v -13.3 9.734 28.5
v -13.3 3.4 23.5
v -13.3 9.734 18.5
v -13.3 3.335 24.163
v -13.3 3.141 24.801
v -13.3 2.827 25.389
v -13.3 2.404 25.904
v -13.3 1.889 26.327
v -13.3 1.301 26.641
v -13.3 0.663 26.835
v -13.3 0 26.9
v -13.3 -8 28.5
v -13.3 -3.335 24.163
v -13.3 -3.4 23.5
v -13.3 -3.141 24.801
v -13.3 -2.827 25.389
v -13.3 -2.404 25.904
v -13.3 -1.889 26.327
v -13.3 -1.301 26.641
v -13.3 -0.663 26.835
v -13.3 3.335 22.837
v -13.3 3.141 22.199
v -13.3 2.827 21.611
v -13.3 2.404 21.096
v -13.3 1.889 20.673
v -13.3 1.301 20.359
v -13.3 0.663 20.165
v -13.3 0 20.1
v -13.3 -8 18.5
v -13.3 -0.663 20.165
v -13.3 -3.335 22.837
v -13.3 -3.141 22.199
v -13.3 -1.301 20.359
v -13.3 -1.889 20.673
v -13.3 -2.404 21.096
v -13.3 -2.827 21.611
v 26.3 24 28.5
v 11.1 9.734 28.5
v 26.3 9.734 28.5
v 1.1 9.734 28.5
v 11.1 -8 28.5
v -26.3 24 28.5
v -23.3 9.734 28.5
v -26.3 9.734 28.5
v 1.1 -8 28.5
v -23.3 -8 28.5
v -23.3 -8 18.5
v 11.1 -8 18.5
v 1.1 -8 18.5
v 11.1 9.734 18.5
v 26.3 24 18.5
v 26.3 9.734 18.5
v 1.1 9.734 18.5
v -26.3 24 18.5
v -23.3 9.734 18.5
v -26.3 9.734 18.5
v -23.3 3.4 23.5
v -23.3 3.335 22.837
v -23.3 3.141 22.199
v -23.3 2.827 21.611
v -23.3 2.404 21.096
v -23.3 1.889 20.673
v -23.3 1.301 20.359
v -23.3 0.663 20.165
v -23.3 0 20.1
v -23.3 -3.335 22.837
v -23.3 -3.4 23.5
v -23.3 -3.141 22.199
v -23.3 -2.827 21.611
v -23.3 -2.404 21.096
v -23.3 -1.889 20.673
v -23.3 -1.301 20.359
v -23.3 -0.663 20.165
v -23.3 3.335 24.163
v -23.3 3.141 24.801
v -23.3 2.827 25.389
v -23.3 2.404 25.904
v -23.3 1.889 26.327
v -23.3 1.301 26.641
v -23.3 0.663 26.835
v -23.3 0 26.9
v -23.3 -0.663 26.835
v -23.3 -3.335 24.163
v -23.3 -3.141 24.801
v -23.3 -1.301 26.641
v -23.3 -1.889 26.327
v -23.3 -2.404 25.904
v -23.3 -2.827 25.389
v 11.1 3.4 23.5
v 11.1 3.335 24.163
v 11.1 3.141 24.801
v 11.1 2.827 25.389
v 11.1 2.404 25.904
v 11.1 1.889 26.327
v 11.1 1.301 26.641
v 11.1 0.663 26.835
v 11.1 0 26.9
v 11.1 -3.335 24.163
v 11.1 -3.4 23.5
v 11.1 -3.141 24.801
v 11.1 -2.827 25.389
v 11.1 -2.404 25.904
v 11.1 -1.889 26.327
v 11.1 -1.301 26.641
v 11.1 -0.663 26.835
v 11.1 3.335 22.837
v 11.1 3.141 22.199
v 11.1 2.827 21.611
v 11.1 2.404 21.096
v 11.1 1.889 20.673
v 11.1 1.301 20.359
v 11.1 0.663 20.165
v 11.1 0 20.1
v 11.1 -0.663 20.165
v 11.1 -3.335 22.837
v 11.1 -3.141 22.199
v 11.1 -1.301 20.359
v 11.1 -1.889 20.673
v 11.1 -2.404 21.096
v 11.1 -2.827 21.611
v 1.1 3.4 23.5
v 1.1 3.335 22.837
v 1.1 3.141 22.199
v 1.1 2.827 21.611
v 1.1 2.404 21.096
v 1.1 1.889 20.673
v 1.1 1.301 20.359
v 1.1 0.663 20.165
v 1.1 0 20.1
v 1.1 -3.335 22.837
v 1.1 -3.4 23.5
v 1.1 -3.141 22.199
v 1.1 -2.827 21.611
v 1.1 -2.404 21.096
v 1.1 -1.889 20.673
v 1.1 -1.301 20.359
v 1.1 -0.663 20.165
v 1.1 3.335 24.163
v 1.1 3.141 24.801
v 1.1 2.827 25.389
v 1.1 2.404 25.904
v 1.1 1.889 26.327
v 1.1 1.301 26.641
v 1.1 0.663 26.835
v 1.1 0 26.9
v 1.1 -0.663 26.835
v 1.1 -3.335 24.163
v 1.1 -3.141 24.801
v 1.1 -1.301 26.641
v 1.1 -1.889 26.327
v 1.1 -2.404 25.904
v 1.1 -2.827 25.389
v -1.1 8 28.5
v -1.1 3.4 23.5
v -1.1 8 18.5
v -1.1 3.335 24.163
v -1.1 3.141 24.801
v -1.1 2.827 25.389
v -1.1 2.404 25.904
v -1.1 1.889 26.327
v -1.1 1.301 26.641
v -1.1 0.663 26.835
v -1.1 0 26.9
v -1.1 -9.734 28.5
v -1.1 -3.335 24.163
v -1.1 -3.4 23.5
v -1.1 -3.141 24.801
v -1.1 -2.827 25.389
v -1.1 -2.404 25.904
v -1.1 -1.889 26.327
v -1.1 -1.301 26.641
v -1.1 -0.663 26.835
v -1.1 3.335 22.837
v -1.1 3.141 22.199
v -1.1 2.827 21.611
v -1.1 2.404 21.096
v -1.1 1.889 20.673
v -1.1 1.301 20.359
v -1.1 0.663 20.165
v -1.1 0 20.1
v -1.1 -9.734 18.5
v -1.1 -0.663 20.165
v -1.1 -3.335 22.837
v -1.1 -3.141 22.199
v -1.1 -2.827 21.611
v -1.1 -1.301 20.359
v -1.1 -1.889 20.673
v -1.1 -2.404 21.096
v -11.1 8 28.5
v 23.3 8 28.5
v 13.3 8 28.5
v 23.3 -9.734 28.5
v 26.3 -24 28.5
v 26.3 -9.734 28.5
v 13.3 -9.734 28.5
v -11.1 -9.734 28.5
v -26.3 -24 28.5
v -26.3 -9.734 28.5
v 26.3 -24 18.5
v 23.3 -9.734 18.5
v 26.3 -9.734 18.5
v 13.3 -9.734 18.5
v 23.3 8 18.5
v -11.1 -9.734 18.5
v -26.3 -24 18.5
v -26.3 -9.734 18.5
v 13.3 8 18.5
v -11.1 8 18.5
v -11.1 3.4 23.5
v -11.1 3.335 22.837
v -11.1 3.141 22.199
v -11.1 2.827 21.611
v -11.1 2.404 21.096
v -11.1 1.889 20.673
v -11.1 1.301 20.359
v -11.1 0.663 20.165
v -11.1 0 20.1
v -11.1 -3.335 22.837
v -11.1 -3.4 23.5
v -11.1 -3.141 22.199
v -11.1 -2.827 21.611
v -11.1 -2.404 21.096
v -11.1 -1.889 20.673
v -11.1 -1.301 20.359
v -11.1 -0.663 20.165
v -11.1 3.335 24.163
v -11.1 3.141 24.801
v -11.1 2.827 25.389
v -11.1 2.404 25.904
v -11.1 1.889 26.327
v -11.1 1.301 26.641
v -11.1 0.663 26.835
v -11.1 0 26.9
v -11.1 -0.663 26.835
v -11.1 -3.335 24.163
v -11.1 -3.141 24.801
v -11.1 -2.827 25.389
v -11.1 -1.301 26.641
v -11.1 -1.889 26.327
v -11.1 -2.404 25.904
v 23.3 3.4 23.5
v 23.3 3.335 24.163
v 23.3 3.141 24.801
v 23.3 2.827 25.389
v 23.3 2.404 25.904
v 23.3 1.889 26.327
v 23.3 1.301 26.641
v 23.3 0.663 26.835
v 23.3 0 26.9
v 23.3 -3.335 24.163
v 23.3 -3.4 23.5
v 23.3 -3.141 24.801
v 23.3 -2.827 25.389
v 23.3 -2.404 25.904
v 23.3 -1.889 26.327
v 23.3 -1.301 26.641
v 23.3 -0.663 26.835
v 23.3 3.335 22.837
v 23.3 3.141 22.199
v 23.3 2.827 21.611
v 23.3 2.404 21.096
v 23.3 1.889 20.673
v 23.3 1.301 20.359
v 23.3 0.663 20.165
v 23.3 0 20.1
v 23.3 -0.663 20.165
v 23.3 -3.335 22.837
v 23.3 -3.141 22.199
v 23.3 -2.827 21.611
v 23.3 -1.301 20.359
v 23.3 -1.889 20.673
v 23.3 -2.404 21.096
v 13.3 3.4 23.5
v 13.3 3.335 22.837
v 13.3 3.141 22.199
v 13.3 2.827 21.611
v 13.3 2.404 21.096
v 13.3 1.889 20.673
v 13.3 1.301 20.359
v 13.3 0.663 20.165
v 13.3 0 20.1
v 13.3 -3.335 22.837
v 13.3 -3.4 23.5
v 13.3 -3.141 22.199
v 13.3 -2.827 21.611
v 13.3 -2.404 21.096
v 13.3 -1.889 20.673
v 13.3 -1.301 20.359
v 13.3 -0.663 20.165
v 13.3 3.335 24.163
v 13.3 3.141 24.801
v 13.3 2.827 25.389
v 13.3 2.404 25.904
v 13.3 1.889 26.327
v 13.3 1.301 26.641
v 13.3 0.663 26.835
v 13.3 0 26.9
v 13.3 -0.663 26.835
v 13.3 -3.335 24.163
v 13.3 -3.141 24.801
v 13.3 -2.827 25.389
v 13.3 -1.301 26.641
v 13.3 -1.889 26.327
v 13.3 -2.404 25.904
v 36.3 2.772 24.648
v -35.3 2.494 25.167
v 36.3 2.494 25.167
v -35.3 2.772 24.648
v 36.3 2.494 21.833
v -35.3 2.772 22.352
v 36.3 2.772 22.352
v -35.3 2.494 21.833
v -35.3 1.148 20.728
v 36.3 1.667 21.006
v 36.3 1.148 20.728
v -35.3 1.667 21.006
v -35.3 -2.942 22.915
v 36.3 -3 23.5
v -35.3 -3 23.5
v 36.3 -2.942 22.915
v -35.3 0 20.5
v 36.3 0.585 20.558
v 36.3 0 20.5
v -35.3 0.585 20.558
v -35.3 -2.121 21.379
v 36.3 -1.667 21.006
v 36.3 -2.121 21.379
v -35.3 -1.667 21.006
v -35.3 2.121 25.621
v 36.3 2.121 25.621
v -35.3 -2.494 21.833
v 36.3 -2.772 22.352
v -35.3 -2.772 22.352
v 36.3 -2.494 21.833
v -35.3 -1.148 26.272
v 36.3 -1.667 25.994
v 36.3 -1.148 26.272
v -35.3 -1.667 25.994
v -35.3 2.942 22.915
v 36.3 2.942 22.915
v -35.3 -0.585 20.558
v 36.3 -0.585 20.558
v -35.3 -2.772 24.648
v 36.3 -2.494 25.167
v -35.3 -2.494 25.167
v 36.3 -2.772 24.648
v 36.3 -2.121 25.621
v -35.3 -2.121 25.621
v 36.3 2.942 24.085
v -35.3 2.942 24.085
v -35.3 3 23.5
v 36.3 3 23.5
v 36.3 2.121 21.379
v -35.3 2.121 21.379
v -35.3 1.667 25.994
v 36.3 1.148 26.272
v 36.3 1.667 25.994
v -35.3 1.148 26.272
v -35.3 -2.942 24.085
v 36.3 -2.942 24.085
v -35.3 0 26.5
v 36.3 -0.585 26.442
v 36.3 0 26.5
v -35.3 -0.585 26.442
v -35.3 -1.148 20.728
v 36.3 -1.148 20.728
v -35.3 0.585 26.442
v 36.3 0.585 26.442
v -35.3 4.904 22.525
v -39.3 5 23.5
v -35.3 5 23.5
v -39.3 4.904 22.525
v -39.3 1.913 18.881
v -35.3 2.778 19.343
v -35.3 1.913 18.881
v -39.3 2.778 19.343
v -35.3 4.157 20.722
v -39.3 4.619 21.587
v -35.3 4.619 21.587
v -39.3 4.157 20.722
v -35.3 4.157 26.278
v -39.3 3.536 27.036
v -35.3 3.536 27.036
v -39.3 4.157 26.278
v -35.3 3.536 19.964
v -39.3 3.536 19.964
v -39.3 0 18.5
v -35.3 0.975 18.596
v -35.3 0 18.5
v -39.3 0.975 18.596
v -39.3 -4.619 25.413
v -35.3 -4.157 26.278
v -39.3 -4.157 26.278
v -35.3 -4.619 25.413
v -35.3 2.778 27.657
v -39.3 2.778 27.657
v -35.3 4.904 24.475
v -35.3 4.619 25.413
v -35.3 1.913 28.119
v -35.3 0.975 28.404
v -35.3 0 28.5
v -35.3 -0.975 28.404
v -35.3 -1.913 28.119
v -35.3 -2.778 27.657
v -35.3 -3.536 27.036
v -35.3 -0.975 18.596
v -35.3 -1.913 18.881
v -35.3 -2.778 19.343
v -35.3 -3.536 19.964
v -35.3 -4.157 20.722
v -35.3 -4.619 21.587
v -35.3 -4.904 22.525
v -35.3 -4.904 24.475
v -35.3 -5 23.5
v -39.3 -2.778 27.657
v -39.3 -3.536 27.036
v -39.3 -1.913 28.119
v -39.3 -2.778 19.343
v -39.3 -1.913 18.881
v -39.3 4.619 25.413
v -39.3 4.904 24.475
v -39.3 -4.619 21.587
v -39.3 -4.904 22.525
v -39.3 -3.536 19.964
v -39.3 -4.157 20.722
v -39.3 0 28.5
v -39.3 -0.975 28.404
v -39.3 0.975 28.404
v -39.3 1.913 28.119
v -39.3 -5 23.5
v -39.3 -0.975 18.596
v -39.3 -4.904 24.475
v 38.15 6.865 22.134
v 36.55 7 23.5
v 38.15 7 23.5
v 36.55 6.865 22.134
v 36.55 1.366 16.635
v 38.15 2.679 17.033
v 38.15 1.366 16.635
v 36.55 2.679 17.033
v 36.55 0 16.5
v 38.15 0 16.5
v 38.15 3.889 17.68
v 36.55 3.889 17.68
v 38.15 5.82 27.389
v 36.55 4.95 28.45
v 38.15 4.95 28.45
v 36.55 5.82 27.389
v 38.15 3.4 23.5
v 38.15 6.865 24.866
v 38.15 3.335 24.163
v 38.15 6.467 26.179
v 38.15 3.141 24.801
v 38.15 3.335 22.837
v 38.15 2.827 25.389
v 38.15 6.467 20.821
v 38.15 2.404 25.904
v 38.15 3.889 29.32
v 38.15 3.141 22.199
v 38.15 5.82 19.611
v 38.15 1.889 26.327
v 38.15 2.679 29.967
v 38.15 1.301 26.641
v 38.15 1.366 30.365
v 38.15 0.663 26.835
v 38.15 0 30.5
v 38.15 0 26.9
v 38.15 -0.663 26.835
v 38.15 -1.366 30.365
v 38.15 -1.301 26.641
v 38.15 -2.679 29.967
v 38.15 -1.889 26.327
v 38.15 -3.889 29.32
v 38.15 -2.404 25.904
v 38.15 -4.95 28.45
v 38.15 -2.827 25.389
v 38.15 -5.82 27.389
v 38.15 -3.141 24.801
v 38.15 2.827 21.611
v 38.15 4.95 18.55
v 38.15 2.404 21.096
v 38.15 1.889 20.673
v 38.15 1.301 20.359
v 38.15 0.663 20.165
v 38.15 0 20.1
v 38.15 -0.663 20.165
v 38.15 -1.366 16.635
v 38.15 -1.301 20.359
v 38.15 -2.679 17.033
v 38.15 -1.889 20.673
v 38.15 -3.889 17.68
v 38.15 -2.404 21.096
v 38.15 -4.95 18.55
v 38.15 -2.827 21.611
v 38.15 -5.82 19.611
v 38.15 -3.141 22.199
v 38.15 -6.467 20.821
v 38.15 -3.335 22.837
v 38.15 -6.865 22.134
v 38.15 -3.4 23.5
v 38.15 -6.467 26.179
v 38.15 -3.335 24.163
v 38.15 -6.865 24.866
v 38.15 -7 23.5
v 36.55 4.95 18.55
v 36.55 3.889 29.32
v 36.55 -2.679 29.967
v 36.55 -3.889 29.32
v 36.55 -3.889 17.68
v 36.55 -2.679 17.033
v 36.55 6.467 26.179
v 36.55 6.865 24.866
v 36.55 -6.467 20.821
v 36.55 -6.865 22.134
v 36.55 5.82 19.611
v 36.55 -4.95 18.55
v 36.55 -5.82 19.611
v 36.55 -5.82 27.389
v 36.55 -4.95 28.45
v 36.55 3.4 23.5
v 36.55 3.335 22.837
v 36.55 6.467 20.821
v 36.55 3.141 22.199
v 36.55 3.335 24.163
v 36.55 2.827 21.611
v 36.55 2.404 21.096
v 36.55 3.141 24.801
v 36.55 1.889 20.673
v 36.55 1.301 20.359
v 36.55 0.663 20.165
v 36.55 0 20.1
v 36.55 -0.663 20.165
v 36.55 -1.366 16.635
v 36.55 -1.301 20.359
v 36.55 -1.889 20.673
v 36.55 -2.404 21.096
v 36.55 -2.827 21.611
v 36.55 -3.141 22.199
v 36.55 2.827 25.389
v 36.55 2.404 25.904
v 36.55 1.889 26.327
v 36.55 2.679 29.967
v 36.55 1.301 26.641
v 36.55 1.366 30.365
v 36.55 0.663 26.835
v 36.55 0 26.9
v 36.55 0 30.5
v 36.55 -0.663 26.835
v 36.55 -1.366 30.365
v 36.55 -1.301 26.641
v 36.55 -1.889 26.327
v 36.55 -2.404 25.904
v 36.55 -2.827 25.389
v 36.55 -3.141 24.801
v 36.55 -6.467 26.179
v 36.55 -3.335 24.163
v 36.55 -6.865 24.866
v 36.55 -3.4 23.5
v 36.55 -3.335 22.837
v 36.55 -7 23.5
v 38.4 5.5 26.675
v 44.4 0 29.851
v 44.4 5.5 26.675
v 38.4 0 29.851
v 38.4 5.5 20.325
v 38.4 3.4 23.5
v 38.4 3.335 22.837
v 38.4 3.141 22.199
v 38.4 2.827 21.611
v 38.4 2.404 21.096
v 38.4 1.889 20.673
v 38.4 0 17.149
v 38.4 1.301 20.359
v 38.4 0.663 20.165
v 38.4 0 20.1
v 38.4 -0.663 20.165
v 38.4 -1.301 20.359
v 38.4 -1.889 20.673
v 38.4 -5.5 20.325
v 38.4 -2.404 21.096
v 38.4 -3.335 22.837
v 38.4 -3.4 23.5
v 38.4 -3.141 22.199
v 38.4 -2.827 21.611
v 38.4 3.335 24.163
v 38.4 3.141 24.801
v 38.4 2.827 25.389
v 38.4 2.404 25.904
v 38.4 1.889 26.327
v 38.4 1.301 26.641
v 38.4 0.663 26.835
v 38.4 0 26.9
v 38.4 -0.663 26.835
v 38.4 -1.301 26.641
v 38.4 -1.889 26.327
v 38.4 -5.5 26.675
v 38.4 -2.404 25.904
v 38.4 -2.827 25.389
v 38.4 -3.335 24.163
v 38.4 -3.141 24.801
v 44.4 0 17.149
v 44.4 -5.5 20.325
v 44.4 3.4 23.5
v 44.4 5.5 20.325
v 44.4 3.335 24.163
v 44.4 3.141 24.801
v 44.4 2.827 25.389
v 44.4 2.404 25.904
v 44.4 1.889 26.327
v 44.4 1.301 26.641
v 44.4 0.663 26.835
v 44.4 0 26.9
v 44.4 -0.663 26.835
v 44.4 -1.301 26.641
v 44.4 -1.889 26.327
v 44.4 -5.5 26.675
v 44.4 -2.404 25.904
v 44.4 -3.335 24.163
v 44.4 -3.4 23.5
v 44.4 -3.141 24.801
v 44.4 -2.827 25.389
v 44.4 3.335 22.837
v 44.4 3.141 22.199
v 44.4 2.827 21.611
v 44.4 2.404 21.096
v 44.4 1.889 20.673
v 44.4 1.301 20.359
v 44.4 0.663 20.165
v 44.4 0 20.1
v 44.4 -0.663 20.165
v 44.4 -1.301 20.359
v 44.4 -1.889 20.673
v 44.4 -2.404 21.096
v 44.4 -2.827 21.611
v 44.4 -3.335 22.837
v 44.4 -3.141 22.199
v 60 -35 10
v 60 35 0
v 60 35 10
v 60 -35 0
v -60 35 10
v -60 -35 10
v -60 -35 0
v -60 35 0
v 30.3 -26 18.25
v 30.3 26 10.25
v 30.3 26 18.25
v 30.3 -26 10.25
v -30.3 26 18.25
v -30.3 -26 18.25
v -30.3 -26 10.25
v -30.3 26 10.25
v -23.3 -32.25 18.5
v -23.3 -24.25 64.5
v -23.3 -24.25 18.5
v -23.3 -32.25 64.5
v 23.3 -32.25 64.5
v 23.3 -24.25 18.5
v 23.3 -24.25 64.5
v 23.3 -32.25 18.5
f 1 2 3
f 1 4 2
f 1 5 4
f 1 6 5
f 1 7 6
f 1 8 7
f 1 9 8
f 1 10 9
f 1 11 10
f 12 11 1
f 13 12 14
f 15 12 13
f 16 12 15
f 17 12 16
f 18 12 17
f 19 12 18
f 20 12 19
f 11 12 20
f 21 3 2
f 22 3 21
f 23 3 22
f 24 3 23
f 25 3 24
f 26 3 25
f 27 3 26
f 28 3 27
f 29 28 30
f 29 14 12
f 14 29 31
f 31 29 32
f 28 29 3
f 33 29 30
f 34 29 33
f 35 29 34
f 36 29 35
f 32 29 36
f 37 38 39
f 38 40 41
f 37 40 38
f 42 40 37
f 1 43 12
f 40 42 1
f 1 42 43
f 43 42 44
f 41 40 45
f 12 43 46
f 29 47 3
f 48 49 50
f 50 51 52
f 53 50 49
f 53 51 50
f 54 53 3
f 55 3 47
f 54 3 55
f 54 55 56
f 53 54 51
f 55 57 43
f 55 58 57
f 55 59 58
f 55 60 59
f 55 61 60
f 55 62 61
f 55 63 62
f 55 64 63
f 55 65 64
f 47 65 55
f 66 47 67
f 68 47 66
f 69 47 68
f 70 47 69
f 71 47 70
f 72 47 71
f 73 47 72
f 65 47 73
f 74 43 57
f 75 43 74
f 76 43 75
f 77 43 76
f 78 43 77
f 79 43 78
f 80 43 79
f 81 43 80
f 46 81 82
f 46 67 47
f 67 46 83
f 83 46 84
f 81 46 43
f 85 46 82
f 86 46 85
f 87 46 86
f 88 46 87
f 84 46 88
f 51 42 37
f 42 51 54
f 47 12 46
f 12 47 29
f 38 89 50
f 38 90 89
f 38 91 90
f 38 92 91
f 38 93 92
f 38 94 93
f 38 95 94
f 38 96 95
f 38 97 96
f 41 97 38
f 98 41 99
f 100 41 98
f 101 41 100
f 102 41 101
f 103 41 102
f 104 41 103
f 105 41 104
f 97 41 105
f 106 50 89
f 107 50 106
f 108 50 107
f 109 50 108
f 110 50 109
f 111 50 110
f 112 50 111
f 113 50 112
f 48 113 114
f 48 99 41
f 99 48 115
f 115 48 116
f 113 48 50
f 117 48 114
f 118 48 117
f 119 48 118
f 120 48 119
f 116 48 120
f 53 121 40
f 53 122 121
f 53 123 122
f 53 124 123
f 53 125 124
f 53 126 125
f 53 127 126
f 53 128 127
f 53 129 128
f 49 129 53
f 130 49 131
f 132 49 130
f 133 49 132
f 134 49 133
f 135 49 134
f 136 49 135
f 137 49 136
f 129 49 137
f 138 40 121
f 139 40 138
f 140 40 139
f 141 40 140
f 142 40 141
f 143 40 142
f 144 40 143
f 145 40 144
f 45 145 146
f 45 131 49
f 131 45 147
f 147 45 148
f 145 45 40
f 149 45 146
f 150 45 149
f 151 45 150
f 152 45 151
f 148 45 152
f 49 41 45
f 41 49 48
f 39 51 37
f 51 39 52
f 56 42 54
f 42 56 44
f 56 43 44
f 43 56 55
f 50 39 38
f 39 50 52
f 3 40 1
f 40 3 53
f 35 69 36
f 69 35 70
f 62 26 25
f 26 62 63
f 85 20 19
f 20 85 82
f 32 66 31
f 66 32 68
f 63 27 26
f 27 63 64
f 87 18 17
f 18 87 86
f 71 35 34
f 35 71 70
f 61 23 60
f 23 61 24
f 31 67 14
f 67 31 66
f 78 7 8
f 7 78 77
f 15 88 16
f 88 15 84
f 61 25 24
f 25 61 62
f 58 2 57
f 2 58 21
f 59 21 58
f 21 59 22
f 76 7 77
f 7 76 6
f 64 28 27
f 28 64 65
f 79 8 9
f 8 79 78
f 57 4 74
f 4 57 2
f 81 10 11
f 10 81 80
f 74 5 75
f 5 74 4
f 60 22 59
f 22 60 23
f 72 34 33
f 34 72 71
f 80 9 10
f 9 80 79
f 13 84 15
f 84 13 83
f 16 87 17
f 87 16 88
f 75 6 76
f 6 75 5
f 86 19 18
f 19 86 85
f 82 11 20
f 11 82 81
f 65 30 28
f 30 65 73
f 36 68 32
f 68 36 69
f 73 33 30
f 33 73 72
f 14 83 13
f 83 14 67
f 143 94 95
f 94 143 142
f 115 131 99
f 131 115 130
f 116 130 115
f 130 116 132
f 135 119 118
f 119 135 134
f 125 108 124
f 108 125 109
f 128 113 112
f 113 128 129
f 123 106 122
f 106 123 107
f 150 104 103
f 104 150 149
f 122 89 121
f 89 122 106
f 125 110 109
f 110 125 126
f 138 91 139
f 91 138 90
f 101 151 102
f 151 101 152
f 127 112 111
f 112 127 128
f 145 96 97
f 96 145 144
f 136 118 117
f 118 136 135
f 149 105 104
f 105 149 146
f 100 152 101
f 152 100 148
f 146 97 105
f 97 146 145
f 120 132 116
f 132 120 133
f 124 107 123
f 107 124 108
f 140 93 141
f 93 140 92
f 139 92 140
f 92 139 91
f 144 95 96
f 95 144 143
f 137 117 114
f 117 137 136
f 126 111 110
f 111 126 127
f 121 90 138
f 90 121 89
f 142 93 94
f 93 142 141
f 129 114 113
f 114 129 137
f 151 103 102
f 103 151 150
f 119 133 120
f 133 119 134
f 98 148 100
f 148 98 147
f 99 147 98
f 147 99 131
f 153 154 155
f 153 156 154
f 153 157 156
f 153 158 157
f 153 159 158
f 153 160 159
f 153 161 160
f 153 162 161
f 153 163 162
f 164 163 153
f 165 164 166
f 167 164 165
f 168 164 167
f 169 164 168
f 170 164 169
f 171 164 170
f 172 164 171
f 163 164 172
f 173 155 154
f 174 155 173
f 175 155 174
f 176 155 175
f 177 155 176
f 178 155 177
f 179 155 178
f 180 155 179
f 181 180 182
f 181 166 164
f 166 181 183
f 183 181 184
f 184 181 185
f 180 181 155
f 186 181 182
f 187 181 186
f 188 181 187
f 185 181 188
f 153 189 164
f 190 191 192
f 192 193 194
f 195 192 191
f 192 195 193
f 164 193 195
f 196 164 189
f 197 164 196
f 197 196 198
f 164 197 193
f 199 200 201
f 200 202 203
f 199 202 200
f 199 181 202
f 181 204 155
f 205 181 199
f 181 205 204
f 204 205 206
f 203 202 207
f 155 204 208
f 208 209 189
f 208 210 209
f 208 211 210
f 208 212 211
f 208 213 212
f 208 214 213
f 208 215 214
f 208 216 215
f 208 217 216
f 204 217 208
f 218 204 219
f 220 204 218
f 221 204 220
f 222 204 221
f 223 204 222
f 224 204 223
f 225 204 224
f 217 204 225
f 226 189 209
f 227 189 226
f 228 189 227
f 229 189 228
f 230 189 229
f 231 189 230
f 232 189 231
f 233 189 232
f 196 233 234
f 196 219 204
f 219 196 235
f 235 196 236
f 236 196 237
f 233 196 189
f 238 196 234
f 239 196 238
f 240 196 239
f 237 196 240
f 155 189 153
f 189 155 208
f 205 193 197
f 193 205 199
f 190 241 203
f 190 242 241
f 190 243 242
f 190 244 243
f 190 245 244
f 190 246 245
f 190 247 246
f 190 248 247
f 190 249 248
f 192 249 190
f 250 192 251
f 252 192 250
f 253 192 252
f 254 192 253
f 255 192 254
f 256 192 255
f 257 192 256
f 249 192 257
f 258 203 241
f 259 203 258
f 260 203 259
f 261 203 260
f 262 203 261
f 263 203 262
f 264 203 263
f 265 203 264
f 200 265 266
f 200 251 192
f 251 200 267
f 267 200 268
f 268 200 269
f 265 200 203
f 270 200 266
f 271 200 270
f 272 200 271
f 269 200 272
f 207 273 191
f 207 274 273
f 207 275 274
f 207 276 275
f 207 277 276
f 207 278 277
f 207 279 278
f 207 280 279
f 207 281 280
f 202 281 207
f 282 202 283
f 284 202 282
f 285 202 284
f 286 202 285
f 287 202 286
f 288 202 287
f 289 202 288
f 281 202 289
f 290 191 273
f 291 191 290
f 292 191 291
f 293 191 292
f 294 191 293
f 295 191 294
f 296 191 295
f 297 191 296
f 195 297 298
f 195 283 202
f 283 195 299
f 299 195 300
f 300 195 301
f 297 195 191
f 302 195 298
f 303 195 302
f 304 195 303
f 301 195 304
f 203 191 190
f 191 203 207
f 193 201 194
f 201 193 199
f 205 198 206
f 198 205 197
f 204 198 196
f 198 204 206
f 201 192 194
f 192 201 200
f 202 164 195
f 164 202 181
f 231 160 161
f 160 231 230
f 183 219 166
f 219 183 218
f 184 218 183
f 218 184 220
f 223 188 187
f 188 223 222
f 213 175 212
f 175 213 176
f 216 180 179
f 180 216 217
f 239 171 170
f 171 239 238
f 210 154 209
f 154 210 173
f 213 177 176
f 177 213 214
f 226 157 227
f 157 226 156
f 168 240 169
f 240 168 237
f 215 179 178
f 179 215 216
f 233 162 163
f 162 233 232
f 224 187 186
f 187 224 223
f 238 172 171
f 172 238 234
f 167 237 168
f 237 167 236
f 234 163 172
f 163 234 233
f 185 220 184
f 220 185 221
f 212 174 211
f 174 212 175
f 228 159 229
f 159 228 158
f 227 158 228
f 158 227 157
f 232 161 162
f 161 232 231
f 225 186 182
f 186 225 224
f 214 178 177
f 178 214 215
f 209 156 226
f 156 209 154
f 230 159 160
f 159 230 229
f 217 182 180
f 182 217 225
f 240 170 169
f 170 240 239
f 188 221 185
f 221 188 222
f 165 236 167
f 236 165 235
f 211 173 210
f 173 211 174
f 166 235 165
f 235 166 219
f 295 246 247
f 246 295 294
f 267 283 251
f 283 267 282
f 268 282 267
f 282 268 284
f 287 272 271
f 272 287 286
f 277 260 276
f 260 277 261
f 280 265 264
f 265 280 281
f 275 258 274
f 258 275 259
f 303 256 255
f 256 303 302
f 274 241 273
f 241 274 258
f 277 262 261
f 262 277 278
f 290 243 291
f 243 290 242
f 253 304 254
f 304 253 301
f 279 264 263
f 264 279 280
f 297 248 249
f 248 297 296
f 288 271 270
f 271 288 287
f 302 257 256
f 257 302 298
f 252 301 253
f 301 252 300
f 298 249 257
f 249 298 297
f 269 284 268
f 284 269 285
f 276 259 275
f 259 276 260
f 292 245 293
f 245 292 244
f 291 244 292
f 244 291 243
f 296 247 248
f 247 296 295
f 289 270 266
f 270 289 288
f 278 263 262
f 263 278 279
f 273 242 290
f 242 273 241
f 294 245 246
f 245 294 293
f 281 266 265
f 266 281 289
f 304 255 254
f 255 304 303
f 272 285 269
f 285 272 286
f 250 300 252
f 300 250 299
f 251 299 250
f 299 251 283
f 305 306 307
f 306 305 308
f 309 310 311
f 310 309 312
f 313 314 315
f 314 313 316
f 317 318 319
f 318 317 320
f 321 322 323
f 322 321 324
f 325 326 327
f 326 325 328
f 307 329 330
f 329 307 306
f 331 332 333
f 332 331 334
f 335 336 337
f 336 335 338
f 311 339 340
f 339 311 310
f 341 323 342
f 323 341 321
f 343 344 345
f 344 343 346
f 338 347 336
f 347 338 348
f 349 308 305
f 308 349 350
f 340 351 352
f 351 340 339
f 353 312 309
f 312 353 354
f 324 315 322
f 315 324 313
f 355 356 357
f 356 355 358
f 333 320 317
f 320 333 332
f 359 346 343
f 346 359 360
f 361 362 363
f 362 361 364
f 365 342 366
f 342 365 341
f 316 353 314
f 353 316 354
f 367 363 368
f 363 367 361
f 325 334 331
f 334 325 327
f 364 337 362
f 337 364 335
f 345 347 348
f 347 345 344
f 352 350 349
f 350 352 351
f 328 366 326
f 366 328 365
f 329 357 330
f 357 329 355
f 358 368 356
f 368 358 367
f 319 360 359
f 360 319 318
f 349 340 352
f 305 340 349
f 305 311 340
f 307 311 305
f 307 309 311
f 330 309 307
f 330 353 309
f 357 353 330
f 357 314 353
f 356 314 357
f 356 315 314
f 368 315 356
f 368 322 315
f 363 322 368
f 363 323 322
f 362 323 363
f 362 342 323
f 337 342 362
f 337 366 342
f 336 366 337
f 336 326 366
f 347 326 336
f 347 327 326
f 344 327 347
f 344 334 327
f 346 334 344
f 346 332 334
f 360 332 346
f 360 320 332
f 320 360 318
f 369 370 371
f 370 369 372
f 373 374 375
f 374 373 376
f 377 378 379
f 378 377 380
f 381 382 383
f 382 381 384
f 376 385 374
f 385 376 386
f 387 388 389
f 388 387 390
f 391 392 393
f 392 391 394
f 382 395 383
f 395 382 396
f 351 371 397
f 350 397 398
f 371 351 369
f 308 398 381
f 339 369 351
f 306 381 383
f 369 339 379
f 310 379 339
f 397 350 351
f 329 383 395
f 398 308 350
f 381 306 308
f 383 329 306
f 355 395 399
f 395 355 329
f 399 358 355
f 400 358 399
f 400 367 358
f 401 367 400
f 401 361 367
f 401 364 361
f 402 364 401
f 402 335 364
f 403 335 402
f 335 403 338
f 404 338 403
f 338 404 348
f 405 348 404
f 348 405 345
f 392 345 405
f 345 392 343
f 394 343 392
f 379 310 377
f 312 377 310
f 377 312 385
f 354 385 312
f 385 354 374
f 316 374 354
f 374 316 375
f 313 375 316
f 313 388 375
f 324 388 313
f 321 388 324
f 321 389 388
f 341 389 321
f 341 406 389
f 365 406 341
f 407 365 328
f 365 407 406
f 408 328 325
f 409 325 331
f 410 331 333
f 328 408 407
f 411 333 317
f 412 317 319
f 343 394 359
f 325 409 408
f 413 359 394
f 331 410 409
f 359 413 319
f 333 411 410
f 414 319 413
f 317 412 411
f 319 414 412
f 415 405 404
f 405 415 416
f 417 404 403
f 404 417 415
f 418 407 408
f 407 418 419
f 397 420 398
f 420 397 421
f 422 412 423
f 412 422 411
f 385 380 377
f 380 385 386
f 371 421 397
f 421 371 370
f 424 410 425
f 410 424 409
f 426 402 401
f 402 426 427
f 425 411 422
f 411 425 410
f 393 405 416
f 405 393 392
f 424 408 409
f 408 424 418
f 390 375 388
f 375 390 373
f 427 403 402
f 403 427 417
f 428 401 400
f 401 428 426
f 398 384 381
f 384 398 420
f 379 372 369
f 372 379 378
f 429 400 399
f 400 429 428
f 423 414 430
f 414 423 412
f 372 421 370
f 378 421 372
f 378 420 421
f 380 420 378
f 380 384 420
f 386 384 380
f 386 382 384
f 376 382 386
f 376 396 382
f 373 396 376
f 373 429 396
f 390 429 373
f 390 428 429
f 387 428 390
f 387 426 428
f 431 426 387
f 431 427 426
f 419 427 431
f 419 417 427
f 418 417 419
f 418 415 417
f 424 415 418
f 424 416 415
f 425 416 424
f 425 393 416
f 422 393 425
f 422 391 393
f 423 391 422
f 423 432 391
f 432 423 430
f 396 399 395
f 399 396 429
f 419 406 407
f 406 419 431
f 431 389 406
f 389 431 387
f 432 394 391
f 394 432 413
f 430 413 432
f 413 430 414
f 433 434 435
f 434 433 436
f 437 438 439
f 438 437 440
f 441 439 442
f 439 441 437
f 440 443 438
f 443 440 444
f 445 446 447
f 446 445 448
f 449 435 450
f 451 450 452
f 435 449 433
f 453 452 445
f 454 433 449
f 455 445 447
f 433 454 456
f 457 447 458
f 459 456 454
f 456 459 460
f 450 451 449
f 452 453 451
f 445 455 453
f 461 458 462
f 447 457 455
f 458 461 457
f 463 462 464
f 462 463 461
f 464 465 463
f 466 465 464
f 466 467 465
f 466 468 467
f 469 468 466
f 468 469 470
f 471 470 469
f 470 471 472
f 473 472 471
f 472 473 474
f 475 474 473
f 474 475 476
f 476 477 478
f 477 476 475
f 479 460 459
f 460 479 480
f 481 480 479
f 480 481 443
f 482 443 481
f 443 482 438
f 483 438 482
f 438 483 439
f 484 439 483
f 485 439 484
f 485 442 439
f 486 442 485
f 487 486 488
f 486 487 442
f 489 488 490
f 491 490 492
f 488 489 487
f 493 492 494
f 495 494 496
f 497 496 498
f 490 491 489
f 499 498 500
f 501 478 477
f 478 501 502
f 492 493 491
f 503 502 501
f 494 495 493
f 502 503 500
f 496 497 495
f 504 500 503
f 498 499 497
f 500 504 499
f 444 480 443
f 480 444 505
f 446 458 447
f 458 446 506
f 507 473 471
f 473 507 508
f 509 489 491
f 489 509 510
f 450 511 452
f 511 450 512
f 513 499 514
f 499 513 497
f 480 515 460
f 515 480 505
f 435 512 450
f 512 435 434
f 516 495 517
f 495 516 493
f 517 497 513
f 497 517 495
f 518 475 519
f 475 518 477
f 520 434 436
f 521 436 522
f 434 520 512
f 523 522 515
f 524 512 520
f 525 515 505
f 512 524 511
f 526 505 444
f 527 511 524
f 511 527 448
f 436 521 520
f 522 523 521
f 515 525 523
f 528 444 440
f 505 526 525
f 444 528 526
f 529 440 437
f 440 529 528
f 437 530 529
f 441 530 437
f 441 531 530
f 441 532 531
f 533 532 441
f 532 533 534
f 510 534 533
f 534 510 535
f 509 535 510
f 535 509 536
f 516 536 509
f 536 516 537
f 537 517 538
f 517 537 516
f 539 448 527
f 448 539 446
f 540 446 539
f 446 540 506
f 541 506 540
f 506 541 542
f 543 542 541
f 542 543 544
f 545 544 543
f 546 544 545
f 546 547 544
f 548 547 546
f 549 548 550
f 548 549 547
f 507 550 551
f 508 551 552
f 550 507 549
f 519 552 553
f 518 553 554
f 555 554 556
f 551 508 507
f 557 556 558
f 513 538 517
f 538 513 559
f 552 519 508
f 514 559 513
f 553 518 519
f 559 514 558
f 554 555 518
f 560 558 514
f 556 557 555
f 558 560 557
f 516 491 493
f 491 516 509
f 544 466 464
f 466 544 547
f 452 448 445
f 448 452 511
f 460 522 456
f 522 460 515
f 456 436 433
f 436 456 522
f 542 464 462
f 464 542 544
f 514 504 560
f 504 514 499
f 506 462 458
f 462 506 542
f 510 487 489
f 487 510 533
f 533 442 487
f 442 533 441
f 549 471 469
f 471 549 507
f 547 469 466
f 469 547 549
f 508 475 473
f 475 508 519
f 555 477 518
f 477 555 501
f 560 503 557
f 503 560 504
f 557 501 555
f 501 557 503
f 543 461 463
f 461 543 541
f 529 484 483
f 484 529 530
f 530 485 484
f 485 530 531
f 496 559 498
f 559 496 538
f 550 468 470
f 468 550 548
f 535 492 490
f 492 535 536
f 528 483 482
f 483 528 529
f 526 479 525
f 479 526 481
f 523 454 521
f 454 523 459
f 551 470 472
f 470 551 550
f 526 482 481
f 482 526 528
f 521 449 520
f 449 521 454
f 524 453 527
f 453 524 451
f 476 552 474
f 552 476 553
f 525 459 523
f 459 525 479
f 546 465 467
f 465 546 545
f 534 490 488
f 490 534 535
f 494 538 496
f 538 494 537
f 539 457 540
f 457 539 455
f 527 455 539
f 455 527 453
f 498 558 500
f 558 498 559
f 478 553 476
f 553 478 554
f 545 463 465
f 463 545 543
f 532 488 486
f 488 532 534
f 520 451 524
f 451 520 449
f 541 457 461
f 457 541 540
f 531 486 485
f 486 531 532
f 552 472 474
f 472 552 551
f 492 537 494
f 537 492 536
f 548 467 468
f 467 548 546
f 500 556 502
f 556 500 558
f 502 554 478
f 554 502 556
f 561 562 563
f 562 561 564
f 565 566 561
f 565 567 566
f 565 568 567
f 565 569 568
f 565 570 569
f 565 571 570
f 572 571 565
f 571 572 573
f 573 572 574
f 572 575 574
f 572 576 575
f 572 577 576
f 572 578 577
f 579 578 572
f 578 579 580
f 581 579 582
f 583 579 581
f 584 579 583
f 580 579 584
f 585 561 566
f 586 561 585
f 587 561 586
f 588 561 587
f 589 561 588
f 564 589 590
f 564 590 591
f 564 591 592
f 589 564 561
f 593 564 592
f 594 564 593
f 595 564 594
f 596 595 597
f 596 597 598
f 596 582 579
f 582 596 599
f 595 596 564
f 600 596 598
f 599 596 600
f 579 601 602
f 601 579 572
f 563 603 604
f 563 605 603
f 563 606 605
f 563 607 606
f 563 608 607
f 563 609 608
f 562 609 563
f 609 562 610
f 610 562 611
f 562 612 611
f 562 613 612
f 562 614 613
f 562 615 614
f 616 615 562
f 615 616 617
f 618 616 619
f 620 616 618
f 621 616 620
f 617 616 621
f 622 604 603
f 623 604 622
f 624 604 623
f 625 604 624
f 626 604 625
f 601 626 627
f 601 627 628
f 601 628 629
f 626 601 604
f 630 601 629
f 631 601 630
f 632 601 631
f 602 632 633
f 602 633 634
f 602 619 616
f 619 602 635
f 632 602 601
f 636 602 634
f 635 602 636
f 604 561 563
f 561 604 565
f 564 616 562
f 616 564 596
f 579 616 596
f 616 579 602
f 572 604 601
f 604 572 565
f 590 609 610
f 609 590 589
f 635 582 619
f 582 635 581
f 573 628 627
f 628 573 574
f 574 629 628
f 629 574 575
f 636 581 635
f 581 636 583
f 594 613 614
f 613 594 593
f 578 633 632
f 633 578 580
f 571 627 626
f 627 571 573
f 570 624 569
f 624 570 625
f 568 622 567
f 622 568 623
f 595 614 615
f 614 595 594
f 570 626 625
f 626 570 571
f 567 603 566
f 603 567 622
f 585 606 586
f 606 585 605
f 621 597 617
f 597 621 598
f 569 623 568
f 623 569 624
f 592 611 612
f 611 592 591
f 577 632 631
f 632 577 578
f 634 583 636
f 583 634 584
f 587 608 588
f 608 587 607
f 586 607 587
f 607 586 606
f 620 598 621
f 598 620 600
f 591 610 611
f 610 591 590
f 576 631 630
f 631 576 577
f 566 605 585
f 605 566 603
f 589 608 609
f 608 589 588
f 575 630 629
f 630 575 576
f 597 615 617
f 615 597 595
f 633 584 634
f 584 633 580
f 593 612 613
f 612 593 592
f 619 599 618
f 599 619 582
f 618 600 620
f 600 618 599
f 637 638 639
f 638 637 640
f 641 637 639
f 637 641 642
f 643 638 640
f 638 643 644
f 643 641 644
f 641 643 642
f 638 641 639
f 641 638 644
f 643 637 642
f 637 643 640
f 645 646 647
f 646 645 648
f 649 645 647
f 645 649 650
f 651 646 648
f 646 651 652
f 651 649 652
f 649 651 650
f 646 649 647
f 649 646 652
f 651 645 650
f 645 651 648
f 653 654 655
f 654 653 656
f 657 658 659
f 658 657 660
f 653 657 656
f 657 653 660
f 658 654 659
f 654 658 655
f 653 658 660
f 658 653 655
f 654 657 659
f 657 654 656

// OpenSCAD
$fn = 32;

// ------------------------------------------------------------------------
// Comb hinge with flap: leaf 52.6 x 24 mm, pin d6, flap 46 mm
// Every part is its own module, assembly() places every instance.
// ------------------------------------------------------------------------

// --- part 1 ---
module hinge_bed() {
  difference() {
    translate([-60, -35, 0]) cube([120, 70, 10]);
  }
}

// --- part 2 ---
module hinge_riser() {
  difference() {
    translate([-30.3, -26, 0]) cube([60.6, 52, 8]);
  }
}

// --- part 3 ---
module hinge_leaf_a() {
  difference() {
    union() {
      translate([-23.3, -8, -5]) cube([10, 32, 10]);
      translate([1.1, -8, -5]) cube([10, 32, 10]);
      translate([-26.3, 9.734, -5]) cube([52.6, 14.266, 10]);
    }
    translate([-18.3, 0, 0]) rotate([0, 90, 0]) cylinder(h = 12, d = 6.8, center = true);
    translate([6.1, 0, 0]) rotate([0, 90, 0]) cylinder(h = 12, d = 6.8, center = true);
  }
}

// --- part 4 ---
module hinge_leaf_b() {
  difference() {
    union() {
      translate([-11.1, -24, -5]) cube([10, 32, 10]);
      translate([13.3, -24, -5]) cube([10, 32, 10]);
      translate([-26.3, -24, -5]) cube([52.6, 14.266, 10]);
    }
    translate([-6.1, 0, 0]) rotate([0, 90, 0]) cylinder(h = 12, d = 6.8, center = true);
    translate([18.3, 0, 0]) rotate([0, 90, 0]) cylinder(h = 12, d = 6.8, center = true);
  }
}

// --- part 5 ---
module hinge_flap() {
  difference() {
    translate([-23.3, -23, 0]) cube([46.6, 46, 8]);
  }
}

// --- part 6 ---
module hinge_pin() {
  rotate([0, 90, 0]) cylinder(h = 72.6, d = 6, center = true);
  translate([-39.3, 0, 0]) rotate([0, 90, 0]) cylinder(h = 4, d = 10);
}

// --- part 7 ---
module pin_washer() {
  difference() {
      translate([0, 0, 0]) cylinder(h = 1.6, d = 14);
      translate([0, 0, -1]) cylinder(h = 3.6, d = 6.8);
    }
}

// --- part 8 ---
module pin_nut() {
  difference() {
    linear_extrude(height = 6) polygon(points = [[6.351, 0], [3.175, 5.5], [-3.175, 5.5], [-6.351, 0], [-3.175, -5.5], [3.175, -5.5]]);
    translate([0, 0, -1]) cylinder(h = 8, d = 6.8);
  }
}

// --- assembly ---
module assembly() {
  color([0.80, 0.24, 0.20]) translate([0, 0, 0]) rotate([0, 0, 0]) hinge_bed();
  color([0.20, 0.45, 0.75]) translate([0, 0, 10.25]) rotate([0, 0, 0]) hinge_riser();
  color([0.25, 0.62, 0.32]) translate([0, 0, 23.5]) rotate([0, 0, 0]) hinge_leaf_a();
  color([0.92, 0.70, 0.18]) translate([0, 0, 23.5]) rotate([0, 0, 0]) hinge_leaf_b();
  color([0.58, 0.35, 0.70]) translate([0, -24.25, 41.5]) rotate([90, 0, 0]) hinge_flap();
  color([0.16, 0.66, 0.66]) translate([0, 0, 23.5]) rotate([0, 0, 0]) hinge_pin();
  color([0.85, 0.48, 0.18]) translate([36.55, 0, 23.5]) rotate([0, 90, 0]) pin_washer();
  color([0.55, 0.60, 0.65]) translate([38.4, 0, 23.5]) rotate([0, 90, 0]) pin_nut();
}

assembly();
